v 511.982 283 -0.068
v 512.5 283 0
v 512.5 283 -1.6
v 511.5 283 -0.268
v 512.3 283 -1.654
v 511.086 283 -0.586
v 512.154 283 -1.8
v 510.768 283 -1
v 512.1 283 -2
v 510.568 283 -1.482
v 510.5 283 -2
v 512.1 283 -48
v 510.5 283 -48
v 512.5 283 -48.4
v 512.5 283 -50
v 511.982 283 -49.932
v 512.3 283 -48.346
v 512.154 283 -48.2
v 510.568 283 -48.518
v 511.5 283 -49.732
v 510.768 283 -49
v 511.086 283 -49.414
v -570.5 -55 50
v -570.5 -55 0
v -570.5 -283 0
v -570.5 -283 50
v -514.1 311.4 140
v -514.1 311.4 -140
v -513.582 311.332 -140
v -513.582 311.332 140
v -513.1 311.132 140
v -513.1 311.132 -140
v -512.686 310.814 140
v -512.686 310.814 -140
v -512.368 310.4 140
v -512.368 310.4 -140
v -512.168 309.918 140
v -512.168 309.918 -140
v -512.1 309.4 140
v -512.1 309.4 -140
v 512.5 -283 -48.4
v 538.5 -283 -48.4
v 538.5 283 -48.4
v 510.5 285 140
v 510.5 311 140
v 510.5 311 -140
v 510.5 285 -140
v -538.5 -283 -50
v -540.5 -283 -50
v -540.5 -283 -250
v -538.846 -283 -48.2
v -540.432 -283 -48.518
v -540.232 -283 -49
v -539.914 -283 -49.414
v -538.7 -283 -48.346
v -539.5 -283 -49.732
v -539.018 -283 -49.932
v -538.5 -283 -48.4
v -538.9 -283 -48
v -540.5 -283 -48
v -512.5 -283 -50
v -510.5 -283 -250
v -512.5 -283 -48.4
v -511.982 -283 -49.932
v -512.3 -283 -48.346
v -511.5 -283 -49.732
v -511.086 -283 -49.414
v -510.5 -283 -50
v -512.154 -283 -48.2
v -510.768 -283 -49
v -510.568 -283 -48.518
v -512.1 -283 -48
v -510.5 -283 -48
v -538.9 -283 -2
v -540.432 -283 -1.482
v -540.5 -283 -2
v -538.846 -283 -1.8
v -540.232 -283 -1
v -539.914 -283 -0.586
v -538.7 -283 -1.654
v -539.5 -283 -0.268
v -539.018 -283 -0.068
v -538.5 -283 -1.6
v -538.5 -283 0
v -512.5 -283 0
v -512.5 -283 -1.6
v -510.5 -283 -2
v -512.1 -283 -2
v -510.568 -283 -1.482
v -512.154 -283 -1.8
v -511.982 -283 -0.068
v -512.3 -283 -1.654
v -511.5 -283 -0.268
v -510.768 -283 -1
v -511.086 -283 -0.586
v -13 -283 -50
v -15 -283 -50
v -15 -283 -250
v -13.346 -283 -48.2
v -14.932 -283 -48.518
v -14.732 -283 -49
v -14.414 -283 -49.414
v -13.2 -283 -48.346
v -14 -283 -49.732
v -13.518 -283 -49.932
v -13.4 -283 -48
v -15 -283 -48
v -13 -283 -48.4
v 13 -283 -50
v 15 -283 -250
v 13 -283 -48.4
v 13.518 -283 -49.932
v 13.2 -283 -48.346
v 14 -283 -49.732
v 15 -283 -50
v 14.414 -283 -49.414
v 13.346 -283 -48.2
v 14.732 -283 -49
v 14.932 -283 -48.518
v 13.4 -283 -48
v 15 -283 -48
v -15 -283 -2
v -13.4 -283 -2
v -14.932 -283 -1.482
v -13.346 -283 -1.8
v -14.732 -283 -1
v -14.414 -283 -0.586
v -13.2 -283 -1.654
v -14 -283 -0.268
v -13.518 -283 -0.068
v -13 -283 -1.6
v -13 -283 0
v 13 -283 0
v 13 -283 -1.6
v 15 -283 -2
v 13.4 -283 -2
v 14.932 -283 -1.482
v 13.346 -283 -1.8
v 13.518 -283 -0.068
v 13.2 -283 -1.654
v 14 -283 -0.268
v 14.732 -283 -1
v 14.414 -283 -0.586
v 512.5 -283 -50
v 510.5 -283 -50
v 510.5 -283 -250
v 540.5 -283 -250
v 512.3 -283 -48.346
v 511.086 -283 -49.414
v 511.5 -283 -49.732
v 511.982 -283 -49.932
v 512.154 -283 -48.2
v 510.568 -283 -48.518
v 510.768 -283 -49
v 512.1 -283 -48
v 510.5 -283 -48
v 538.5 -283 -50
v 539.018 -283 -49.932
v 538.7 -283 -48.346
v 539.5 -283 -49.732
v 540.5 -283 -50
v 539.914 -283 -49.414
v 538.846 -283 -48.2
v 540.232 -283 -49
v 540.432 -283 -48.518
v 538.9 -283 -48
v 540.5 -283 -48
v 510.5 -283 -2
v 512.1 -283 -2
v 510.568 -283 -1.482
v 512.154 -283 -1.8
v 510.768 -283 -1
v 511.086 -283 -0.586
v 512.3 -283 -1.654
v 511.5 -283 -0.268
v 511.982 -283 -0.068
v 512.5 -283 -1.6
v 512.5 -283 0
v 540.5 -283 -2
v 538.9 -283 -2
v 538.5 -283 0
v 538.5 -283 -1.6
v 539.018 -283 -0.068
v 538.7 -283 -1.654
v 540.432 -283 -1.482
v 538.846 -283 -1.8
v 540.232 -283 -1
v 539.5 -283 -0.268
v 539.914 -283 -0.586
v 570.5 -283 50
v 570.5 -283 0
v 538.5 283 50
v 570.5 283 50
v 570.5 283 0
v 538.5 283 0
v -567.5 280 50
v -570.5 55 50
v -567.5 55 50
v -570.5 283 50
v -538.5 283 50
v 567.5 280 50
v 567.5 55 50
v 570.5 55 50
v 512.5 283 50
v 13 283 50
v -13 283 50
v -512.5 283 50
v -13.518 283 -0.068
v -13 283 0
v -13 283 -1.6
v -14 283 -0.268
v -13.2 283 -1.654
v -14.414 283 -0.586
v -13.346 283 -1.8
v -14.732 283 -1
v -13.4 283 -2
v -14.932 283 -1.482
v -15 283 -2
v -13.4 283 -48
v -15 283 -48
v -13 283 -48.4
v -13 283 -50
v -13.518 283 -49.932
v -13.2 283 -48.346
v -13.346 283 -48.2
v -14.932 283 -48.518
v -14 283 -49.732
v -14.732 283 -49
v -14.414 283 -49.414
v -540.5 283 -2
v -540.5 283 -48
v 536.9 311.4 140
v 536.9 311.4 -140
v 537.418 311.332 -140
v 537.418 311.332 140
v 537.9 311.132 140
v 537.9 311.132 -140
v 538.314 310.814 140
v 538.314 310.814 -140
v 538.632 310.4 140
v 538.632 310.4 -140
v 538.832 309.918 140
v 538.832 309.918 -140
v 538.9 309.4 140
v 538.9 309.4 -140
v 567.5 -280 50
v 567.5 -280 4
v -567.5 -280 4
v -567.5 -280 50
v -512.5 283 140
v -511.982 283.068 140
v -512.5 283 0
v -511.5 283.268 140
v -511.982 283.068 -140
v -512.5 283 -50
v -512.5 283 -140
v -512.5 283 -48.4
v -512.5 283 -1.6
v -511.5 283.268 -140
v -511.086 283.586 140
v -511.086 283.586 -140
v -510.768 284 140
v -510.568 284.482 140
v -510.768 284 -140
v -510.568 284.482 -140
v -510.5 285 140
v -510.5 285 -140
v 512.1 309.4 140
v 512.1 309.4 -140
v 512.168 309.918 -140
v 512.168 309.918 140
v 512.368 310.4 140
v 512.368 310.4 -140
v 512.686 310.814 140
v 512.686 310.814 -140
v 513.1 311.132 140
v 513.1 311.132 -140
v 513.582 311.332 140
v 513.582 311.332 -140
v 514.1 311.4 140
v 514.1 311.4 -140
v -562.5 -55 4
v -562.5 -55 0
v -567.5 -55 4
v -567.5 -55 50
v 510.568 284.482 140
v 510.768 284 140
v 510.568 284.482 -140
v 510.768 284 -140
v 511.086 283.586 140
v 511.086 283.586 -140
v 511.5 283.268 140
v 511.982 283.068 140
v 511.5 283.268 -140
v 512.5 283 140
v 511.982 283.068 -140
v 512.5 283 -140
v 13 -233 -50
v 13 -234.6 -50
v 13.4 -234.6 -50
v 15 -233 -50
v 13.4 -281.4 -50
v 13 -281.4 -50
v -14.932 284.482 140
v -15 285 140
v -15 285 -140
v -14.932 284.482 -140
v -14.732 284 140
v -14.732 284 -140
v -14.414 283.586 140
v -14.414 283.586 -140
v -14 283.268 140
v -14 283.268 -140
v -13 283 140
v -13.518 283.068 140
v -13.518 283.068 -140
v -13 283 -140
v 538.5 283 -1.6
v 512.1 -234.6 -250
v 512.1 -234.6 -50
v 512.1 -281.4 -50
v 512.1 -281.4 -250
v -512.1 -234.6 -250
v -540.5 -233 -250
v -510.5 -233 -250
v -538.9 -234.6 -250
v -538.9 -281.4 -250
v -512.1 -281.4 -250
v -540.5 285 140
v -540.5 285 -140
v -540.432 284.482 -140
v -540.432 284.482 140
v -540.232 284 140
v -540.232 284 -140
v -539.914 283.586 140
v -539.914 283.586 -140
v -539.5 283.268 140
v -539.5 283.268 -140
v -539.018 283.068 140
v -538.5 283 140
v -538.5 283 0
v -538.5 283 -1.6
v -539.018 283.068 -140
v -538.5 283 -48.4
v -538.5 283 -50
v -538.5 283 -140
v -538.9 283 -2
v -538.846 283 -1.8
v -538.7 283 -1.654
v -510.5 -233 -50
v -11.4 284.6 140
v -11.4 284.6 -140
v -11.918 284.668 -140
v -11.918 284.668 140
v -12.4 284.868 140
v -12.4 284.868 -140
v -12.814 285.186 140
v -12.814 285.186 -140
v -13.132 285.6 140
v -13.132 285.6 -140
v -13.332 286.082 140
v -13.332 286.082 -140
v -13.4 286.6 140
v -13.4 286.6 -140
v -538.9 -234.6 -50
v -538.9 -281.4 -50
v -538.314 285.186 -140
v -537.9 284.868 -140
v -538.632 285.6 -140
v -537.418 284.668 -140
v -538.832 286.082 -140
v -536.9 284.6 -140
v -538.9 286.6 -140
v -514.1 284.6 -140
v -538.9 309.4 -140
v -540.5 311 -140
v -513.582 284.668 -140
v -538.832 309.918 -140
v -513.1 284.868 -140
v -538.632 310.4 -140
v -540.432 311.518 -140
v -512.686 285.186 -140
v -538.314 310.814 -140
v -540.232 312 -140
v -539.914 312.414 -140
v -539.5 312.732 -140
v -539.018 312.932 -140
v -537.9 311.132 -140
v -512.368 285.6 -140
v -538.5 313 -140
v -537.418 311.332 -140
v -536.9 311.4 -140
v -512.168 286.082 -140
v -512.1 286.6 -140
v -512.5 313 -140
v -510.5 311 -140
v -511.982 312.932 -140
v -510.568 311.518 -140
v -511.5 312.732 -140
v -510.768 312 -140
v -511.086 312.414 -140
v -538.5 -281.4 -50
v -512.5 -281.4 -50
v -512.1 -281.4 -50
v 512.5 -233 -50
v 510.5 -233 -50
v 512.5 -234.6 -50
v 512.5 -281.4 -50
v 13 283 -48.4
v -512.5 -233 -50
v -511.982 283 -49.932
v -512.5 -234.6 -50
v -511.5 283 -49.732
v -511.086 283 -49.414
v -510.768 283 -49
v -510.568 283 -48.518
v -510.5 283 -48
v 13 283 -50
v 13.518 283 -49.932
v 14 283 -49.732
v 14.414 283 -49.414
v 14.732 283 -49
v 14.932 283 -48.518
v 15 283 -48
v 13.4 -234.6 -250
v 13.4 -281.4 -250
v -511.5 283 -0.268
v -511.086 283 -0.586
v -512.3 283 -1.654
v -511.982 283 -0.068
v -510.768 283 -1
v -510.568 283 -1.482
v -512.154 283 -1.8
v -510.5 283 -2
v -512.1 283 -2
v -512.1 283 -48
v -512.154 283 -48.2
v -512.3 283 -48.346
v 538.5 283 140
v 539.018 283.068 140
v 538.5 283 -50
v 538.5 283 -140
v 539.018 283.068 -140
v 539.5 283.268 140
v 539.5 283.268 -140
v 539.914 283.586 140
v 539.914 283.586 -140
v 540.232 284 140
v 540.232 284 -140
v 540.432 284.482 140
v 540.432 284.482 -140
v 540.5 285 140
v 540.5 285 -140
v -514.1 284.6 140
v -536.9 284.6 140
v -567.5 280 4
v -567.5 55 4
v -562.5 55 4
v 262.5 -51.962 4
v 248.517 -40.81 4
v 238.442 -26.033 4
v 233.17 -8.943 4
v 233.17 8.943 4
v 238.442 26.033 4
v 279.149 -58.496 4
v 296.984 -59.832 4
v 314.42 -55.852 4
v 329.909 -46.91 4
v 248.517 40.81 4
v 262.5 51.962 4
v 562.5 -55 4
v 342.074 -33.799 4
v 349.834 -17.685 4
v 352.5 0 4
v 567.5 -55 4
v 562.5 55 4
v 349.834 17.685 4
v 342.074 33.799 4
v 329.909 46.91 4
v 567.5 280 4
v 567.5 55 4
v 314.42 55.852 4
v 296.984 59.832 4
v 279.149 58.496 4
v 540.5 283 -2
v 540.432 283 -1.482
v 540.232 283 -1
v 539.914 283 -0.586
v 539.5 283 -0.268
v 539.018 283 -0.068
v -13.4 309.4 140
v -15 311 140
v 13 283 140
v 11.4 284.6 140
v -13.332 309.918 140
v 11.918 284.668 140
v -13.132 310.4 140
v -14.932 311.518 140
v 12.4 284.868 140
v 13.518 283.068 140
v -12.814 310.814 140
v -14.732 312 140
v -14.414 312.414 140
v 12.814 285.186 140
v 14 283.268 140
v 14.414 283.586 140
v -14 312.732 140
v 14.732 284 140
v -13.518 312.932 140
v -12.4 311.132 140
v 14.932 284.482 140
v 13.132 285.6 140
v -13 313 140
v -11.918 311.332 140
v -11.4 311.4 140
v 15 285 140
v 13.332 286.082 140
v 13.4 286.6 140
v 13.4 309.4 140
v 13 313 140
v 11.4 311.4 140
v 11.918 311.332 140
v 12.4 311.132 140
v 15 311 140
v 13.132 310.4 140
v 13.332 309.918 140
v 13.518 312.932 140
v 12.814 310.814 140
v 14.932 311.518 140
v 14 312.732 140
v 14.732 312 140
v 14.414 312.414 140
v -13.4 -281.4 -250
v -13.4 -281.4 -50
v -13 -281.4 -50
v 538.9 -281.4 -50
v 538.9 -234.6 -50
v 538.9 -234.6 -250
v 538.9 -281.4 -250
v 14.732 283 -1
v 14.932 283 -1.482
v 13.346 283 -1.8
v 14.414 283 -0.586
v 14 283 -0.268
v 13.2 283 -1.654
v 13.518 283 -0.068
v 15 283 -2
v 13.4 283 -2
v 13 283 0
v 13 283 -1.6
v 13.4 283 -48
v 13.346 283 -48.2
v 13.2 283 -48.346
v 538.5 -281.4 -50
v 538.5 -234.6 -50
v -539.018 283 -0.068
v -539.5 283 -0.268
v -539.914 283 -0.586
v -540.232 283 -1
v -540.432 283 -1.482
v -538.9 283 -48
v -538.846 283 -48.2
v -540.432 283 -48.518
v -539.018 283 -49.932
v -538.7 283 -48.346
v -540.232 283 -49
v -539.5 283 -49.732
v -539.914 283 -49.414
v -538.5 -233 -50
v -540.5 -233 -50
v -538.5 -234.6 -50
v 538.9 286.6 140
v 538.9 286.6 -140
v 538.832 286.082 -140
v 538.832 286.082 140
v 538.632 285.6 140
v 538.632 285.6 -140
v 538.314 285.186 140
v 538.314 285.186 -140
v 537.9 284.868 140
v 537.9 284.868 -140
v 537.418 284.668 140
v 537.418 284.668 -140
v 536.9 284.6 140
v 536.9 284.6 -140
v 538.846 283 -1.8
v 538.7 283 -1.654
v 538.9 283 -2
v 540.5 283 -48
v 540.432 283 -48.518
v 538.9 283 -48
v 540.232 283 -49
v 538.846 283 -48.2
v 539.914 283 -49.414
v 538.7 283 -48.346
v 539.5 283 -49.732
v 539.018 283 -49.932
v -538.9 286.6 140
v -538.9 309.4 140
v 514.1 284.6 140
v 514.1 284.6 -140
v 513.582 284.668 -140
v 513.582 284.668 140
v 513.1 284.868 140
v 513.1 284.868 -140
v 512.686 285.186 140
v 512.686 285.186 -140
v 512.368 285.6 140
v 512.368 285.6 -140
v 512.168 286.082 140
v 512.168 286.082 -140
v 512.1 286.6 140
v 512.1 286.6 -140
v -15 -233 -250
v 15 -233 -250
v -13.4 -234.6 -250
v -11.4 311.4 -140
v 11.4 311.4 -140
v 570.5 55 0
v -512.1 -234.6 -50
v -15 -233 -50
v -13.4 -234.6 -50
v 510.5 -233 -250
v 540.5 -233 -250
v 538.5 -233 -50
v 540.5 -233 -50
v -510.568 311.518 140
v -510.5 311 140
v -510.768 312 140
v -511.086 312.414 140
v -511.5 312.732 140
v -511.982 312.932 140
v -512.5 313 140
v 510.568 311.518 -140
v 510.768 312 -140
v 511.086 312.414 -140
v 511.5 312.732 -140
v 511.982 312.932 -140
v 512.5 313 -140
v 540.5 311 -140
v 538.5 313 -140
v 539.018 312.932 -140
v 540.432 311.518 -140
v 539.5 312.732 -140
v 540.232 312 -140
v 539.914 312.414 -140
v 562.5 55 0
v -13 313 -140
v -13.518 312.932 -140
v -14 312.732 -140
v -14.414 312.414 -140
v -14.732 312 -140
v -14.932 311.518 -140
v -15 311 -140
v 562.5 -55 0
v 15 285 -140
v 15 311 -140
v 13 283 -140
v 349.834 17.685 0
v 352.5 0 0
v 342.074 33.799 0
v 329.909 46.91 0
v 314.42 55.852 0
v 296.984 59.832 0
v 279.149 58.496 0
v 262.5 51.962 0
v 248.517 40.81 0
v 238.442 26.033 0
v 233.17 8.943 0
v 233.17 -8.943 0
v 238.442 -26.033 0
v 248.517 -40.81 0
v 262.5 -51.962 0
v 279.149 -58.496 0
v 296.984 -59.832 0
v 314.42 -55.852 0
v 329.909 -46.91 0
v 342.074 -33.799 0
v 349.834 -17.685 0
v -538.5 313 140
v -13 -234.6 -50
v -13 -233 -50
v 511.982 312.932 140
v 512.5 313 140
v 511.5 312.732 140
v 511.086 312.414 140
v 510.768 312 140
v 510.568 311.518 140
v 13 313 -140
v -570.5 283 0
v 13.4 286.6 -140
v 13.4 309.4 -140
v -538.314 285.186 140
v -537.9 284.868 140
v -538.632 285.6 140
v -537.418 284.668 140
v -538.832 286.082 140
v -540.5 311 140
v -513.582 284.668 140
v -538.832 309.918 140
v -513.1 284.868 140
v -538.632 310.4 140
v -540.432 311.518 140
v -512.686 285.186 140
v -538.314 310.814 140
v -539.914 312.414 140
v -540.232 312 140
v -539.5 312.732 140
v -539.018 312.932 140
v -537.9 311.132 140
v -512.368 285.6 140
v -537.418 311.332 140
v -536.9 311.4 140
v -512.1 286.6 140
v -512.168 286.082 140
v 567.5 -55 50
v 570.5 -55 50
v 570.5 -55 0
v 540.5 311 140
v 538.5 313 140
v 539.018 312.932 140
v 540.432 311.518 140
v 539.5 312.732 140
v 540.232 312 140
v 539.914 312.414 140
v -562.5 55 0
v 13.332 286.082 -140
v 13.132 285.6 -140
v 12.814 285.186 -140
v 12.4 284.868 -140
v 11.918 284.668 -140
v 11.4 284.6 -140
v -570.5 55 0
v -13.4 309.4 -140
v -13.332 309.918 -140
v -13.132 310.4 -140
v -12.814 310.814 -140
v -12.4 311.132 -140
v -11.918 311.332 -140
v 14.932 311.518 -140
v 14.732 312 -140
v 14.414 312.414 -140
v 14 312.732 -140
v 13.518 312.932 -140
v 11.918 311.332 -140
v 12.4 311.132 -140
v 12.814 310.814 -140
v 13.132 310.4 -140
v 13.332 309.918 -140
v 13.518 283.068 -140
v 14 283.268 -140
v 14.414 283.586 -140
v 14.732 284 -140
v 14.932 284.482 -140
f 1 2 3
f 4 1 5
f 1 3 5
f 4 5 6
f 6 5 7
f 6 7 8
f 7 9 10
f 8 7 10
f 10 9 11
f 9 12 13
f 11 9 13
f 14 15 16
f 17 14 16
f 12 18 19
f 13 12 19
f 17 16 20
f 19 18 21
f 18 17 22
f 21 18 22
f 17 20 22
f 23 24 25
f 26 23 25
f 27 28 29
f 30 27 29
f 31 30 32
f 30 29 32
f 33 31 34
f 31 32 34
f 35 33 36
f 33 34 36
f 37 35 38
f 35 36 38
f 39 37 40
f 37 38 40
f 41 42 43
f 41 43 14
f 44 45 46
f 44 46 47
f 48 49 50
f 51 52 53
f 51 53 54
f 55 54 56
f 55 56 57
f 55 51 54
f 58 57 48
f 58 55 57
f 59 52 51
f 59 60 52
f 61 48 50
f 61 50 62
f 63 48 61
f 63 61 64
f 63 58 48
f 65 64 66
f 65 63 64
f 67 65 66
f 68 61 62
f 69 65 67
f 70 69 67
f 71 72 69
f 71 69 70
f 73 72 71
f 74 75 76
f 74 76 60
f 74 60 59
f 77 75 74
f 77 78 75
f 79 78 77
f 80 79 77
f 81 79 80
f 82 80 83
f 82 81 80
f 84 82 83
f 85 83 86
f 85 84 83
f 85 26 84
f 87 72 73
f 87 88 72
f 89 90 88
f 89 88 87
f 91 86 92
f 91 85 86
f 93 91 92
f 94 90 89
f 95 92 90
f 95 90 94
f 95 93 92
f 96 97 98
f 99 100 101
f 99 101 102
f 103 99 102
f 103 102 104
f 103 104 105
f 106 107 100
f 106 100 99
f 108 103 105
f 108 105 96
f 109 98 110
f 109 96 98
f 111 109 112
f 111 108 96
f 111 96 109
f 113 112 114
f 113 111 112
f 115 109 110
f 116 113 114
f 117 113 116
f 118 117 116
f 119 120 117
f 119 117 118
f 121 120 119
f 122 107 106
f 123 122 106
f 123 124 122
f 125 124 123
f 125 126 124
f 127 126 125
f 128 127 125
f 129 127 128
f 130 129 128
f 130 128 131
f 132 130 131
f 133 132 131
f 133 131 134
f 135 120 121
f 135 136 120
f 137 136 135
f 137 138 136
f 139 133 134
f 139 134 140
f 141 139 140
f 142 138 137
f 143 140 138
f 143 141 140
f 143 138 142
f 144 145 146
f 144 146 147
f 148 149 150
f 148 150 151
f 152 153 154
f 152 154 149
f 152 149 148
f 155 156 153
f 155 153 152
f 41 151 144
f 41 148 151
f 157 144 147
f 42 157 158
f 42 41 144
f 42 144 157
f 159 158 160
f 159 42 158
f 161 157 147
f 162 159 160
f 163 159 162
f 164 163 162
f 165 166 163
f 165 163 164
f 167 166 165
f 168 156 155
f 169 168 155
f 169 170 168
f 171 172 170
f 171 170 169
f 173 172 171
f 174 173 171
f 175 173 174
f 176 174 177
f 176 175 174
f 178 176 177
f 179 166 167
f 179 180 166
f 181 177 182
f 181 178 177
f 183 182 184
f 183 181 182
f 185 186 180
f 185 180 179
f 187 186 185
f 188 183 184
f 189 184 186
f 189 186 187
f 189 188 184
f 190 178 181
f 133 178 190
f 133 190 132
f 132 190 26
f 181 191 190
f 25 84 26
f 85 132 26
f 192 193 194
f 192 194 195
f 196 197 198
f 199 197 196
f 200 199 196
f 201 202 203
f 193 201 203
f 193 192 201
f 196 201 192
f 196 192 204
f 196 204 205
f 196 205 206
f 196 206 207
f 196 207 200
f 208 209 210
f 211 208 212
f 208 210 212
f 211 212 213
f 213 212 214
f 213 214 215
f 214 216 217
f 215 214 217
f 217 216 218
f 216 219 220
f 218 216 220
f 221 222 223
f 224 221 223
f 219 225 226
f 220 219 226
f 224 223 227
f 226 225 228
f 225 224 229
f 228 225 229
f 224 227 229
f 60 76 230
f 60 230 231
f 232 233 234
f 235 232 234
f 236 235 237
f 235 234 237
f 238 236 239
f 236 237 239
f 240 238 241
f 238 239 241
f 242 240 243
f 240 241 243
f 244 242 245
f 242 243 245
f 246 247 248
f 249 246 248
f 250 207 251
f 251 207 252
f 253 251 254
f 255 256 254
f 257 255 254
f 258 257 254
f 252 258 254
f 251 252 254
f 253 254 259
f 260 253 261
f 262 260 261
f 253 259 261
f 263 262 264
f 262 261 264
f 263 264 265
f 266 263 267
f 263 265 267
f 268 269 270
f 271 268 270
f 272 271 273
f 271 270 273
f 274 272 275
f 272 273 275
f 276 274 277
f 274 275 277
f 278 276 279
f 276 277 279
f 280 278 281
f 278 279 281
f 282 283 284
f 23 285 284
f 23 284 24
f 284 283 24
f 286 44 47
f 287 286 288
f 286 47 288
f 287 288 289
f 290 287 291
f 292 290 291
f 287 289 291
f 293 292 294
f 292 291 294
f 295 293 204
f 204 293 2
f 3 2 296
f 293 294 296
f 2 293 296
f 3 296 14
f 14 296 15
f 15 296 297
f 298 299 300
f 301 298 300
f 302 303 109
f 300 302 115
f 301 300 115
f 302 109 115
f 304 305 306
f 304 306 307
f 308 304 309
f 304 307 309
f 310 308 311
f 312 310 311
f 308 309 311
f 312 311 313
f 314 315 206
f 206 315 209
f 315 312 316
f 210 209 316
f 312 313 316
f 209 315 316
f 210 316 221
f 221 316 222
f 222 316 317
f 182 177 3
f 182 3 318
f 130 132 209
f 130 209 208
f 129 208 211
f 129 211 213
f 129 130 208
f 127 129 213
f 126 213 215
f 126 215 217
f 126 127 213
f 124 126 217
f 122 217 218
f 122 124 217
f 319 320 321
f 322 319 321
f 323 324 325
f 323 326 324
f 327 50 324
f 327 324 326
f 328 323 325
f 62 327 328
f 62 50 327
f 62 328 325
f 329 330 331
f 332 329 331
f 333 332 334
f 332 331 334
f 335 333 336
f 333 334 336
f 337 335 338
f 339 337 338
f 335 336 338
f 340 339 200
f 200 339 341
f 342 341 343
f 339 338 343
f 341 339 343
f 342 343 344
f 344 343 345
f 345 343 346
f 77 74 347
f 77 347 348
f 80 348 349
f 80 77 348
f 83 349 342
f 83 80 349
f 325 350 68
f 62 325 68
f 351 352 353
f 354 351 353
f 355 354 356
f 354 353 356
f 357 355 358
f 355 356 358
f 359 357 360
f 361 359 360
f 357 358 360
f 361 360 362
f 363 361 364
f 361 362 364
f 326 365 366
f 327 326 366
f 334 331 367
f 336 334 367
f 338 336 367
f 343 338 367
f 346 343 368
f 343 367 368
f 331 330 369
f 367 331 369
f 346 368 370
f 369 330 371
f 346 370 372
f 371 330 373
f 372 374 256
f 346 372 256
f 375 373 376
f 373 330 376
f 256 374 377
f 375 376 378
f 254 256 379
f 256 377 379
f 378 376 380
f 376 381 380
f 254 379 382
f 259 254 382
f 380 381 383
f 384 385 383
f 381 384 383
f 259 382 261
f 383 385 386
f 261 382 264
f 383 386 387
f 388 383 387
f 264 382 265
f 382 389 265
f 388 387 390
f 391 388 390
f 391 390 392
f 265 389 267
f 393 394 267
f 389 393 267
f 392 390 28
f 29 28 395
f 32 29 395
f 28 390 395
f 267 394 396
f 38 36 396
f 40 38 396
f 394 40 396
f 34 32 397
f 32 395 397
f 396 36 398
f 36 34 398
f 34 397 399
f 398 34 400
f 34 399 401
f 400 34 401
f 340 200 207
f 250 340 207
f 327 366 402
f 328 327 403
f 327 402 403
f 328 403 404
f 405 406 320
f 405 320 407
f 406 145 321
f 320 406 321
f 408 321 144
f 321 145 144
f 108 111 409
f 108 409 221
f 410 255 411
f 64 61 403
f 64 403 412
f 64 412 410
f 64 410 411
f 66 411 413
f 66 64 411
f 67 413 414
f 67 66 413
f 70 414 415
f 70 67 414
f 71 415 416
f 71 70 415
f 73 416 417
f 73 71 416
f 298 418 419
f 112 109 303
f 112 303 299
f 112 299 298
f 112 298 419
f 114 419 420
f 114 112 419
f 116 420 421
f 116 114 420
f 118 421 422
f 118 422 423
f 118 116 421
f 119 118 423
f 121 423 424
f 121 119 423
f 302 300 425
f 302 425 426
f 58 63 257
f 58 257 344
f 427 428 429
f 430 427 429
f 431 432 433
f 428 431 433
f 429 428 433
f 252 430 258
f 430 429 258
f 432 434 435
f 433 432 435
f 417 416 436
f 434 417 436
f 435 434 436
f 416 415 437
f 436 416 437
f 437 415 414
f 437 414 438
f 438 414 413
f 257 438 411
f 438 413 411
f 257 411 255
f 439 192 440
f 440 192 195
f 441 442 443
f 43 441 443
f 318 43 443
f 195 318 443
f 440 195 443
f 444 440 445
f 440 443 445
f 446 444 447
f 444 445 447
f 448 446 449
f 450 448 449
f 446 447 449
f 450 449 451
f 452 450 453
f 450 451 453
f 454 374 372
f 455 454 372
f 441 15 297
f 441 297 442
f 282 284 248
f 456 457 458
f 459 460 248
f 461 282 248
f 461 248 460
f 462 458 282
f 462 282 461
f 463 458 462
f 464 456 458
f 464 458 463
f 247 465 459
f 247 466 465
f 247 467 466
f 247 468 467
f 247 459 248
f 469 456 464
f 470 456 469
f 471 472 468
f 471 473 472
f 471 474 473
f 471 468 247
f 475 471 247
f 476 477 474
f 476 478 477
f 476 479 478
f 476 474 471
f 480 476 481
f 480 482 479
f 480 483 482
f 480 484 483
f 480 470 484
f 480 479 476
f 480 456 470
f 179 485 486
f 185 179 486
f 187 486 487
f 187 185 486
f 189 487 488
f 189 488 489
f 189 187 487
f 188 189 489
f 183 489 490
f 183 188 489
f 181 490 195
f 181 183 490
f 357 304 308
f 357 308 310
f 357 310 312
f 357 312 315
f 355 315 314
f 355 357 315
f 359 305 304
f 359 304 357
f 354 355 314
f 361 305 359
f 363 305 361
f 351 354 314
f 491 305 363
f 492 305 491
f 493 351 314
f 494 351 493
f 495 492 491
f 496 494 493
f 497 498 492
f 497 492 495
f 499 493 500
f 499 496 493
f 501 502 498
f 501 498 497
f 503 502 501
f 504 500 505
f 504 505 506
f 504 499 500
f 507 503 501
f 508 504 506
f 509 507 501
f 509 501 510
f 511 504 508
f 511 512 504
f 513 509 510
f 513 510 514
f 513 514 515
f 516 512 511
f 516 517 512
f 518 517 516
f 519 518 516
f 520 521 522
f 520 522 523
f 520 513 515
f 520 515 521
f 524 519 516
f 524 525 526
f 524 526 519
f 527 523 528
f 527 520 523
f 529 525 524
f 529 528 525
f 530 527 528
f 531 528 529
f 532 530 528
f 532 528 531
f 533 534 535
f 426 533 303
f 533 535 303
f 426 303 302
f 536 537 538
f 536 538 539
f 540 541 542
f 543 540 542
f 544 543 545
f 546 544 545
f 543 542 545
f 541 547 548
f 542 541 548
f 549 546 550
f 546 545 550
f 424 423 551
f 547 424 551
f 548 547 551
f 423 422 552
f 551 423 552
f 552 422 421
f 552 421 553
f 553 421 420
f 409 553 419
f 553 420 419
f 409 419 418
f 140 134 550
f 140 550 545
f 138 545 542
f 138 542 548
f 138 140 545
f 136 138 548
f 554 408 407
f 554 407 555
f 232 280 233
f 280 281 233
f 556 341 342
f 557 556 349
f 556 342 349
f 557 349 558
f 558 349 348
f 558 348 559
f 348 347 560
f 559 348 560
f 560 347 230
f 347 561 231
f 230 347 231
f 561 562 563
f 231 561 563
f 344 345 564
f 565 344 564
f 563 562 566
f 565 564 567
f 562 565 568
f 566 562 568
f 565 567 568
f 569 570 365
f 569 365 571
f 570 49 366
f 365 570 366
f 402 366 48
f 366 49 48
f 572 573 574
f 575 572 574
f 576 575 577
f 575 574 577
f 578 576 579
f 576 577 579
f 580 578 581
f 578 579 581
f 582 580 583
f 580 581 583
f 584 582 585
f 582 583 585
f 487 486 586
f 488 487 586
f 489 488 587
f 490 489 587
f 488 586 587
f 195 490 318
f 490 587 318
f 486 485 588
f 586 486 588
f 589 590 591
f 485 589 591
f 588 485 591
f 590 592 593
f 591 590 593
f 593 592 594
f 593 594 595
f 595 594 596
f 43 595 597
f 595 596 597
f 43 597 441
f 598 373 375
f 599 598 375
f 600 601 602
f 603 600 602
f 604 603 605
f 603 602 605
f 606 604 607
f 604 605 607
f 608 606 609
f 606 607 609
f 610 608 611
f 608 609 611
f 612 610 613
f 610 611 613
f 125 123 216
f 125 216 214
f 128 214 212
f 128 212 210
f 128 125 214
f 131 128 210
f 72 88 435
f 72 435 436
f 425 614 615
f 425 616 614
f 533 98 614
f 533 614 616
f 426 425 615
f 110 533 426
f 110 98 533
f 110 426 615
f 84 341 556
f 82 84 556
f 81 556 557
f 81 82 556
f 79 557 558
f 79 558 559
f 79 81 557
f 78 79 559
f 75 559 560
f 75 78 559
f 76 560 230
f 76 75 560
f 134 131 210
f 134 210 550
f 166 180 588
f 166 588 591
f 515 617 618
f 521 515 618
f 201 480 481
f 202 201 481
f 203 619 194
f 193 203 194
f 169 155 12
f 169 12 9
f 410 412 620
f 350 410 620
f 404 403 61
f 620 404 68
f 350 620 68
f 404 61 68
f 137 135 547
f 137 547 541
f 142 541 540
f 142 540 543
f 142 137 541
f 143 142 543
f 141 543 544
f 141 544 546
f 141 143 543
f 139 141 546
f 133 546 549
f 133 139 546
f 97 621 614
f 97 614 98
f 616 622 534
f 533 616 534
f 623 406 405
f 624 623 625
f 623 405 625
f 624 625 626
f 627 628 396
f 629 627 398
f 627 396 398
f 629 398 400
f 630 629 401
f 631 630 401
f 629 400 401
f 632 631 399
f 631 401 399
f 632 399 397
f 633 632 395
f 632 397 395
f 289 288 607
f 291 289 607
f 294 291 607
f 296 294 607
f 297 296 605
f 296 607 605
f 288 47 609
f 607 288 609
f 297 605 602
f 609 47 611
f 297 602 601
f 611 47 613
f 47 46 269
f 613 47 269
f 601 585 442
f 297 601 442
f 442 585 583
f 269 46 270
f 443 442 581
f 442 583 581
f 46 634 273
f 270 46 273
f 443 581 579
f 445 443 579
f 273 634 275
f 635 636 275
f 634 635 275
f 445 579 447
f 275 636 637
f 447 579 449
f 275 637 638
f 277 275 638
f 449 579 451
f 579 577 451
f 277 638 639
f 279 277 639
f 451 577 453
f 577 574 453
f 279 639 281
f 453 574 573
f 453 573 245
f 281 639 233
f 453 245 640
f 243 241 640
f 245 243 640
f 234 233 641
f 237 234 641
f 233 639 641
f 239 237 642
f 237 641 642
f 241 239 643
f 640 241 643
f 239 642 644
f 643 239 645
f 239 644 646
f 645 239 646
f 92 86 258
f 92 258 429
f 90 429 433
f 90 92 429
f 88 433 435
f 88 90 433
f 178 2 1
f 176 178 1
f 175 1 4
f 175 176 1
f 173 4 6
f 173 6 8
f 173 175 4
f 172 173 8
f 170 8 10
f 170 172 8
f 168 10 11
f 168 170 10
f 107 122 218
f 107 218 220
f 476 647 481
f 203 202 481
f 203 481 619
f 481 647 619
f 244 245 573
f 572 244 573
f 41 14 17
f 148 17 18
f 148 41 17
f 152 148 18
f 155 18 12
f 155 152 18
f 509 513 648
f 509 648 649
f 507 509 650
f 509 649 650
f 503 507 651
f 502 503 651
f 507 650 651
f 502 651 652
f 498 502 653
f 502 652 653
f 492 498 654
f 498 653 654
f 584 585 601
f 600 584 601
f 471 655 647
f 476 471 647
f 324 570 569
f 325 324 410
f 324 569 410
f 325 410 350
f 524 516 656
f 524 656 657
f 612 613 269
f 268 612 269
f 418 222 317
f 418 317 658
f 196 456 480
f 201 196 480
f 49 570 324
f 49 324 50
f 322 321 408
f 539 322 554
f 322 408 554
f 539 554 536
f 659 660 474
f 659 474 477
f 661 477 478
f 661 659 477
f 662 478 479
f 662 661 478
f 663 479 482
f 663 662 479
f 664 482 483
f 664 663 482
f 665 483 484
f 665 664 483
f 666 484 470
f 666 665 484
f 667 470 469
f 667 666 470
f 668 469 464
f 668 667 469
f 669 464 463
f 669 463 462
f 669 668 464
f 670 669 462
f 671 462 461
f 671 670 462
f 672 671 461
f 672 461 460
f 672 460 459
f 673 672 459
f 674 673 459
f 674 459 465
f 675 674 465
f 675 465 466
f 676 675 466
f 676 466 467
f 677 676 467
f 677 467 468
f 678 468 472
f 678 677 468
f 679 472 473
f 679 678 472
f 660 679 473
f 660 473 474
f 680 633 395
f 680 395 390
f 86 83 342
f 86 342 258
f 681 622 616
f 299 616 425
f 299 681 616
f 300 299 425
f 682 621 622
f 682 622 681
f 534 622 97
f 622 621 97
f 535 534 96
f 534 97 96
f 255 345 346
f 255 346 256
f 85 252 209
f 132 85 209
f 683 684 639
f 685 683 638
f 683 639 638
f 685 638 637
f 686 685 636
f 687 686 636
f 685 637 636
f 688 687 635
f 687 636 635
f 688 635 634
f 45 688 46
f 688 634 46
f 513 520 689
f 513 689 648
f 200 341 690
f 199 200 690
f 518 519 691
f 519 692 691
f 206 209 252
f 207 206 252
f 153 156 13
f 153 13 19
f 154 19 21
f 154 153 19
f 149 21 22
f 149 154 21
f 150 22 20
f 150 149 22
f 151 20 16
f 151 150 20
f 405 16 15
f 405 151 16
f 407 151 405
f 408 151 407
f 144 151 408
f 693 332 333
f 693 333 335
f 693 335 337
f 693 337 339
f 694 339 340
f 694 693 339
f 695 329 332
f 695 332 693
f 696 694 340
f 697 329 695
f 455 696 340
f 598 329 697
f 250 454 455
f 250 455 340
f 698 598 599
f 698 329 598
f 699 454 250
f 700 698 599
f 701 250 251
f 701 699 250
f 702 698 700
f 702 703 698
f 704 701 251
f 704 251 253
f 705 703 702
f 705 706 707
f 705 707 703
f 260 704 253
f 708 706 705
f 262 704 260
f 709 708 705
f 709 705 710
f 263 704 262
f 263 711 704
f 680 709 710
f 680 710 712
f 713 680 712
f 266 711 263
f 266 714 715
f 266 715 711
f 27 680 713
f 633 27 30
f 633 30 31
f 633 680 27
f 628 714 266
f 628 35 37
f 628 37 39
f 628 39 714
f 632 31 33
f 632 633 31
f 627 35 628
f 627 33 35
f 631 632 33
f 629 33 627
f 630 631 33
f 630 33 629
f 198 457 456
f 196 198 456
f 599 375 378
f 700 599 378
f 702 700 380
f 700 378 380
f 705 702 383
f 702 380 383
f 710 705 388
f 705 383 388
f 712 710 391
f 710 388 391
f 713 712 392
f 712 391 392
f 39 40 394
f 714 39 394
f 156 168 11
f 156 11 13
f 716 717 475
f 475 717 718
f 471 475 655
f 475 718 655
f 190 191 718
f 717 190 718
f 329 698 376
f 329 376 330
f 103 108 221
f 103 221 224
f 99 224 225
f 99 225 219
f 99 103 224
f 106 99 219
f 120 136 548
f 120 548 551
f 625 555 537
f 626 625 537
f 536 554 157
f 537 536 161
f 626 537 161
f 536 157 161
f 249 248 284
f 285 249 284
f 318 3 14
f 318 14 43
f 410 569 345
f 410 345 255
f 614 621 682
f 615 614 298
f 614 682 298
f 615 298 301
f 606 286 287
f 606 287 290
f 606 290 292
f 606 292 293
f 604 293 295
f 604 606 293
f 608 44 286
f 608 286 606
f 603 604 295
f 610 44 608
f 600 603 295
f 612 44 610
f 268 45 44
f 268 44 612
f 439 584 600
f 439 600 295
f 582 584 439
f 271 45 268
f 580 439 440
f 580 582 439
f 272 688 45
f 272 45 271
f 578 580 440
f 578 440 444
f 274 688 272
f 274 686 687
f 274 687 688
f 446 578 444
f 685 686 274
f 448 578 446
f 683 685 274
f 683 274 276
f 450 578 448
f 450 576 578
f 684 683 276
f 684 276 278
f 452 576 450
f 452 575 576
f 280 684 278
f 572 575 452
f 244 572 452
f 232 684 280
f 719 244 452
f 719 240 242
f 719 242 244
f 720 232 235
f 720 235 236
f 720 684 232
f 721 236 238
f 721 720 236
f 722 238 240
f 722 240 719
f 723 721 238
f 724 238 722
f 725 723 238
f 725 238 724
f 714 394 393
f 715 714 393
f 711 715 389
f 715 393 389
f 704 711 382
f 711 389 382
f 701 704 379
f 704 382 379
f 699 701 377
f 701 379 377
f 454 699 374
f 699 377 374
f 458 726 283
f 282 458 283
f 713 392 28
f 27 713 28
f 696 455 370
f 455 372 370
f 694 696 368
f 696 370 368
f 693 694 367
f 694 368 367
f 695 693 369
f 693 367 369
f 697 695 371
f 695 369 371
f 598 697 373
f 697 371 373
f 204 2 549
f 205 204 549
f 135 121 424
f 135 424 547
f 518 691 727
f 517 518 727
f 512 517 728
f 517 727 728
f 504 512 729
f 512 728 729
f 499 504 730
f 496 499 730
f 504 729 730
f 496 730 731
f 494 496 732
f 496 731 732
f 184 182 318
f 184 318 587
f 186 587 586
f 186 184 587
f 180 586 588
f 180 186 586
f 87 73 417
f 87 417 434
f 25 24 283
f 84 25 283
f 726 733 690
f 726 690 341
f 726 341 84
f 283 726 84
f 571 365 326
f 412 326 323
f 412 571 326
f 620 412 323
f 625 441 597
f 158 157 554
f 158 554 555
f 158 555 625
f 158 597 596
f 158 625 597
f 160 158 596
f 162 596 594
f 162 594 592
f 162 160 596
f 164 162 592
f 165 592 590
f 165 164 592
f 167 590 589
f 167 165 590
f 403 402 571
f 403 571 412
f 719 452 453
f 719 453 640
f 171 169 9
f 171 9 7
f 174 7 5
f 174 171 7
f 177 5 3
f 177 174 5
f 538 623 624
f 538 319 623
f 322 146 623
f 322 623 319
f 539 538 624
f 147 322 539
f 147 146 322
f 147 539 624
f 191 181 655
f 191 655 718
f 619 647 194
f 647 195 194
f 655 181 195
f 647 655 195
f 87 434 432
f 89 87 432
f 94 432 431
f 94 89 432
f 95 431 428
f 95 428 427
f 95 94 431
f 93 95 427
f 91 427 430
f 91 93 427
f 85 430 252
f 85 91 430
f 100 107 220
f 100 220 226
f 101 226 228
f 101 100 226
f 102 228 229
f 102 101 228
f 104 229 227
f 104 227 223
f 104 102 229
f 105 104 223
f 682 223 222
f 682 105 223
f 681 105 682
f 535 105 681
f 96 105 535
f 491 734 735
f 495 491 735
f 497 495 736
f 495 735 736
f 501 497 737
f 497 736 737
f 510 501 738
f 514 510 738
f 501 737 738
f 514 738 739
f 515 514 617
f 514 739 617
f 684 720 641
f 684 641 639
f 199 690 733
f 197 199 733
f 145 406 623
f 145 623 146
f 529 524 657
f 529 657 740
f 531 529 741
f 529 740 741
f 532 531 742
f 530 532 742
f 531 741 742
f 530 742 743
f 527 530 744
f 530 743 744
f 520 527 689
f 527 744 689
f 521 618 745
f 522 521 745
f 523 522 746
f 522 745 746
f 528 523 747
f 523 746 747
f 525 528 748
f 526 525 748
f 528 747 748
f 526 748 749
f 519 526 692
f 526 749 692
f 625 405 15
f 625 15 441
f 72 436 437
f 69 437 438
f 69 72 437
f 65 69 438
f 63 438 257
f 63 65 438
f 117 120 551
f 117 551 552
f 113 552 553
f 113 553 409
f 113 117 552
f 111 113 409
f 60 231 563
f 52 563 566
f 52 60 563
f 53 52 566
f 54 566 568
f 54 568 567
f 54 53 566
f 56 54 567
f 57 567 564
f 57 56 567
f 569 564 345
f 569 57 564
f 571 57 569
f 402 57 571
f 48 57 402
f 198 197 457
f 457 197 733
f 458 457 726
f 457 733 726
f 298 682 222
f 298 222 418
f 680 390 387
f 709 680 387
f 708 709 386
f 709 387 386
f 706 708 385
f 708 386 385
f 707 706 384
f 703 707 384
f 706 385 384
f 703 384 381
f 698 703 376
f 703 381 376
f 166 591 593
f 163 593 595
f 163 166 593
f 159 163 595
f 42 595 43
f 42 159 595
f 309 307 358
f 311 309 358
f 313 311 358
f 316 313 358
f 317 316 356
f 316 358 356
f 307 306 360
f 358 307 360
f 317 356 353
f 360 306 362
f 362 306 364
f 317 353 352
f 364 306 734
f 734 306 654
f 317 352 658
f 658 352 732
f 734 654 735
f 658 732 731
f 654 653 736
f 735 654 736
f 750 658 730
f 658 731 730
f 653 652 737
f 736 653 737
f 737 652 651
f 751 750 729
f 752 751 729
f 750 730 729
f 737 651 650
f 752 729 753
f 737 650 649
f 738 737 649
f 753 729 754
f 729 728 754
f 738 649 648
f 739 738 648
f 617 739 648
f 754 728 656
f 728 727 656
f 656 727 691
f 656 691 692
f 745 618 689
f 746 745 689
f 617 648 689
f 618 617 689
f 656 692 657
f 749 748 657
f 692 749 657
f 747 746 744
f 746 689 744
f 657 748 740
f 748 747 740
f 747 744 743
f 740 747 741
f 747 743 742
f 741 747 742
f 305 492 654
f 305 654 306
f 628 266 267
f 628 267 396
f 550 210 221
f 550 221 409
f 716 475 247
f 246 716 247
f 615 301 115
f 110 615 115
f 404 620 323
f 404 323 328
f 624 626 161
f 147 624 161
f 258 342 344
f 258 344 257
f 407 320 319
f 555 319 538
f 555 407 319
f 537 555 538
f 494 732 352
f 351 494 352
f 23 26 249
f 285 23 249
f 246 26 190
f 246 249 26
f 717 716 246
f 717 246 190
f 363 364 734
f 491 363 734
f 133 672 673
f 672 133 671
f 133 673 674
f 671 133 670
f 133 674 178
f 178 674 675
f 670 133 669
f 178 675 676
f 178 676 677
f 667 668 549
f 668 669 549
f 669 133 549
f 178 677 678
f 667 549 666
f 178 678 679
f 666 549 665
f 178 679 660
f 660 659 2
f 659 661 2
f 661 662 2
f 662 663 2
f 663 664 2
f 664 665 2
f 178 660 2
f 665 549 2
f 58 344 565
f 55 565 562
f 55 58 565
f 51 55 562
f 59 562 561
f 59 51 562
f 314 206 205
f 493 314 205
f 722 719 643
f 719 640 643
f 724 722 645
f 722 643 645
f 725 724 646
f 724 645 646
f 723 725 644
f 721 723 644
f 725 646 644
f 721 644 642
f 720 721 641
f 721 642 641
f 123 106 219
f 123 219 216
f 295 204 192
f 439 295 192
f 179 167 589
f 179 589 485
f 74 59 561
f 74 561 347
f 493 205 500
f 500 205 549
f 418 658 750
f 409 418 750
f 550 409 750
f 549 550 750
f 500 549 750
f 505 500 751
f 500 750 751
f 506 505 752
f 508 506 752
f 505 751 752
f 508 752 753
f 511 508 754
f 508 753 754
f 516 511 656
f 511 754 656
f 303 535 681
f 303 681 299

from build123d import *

# Parameters (mm, degrees)
F0_R          = 60
F1_DEPTH      = 4
F2_DEPTH      = 50
F4_DEPTH      = 566
F5_DEPTH      = 140
F5_DEPTH_BACK = 140
F6_W          = 30
F6_H          = 50
F6_W_2        = 26.8
F6_H_2        = 46.8
F7_DEPTH      = 200


with BuildPart() as f1:
    # F0 (on Top) → F1 (new body)
    with BuildSketch(Plane.XY):
        Polygon((567.5, 55), (567.5, 280), (-567.5, 280), (-567.5, 55), (-562.5, 55), (-562.5, -55), (-567.5, -55), (-567.5, -280), (567.5, -280), (567.5, -55), (562.5, -55), (562.5, 55), align=None)
        with Locations((292.5, 0)):
            Circle(F0_R, mode=Mode.SUBTRACT)
    extrude(amount=F1_DEPTH)

    # F0 (on Top) → F2 (join)
    with BuildSketch(Plane.XY):
        Polygon((-567.5, 280), (567.5, 280), (567.5, 55), (570.5, 55), (570.5, 283), (538.5, 283), (512.5, 283), (13, 283), (-13, 283), (-512.5, 283), (-538.5, 283), (-570.5, 283), (-570.5, 55), (-567.5, 55), align=None)
        Polygon((570.5, -55), (567.5, -55), (567.5, -280), (-567.5, -280), (-567.5, -55), (-570.5, -55), (-570.5, -283), (570.5, -283), align=None)
    extrude(amount=F2_DEPTH)

    # F3 (on face) → F4 (join)
    with BuildSketch(Plane.XZ.offset(283)):
        with BuildLine():
            Line((-512.5, 0), (-538.5, 0))
            ThreePointArc((-538.5, 0), (-539.9142135624, -0.5857864376), (-540.5, -2))
            Line((-540.5, -2), (-540.5, -48))
            ThreePointArc((-540.5, -48), (-539.9142135624, -49.4142135624), (-538.5, -50))
            Line((-538.5, -50), (-512.5, -50))
            ThreePointArc((-512.5, -50), (-511.0857864376, -49.4142135624), (-510.5, -48))
            Line((-510.5, -48), (-510.5, -2))
            ThreePointArc((-510.5, -2), (-511.0857864376, -0.5857864376), (-512.5, 0))
        make_face()
        with BuildLine():
            Line((-538.9, -48), (-538.9, -2))
            ThreePointArc((-538.9, -2), (-538.7828427125, -1.7171572875), (-538.5, -1.6))
            Line((-538.5, -1.6), (-512.5, -1.6))
            ThreePointArc((-512.5, -1.6), (-512.2171572875, -1.7171572875), (-512.1, -2))
            Line((-512.1, -2), (-512.1, -48))
            ThreePointArc((-512.1, -48), (-512.2171572875, -48.2828427125), (-512.5, -48.4))
            Line((-512.5, -48.4), (-538.5, -48.4))
            ThreePointArc((-538.5, -48.4), (-538.7828427125, -48.2828427125), (-538.9, -48))
        make_face(mode=Mode.SUBTRACT)
        with BuildLine():
            Line((13, 0), (-13, 0))
            ThreePointArc((-13, 0), (-14.4142135624, -0.5857864376), (-15, -2))
            Line((-15, -2), (-15, -48))
            ThreePointArc((-15, -48), (-14.4142135624, -49.4142135624), (-13, -50))
            Line((-13, -50), (13, -50))
            ThreePointArc((13, -50), (14.4142135624, -49.4142135624), (15, -48))
            Line((15, -48), (15, -2))
            ThreePointArc((15, -2), (14.4142135624, -0.5857864376), (13, 0))
        make_face()
        with BuildLine():
            Line((-13.4, -48), (-13.4, -2))
            ThreePointArc((-13.4, -2), (-13.2828427125, -1.7171572875), (-13, -1.6))
            Line((-13, -1.6), (13, -1.6))
            ThreePointArc((13, -1.6), (13.2828427125, -1.7171572875), (13.4, -2))
            Line((13.4, -2), (13.4, -48))
            ThreePointArc((13.4, -48), (13.2828427125, -48.2828427125), (13, -48.4))
            Line((13, -48.4), (-13, -48.4))
            ThreePointArc((-13, -48.4), (-13.2828427125, -48.2828427125), (-13.4, -48))
        make_face(mode=Mode.SUBTRACT)
        with BuildLine():
            Line((538.5, 0), (512.5, 0))
            ThreePointArc((512.5, 0), (511.0857864376, -0.5857864376), (510.5, -2))
            Line((510.5, -2), (510.5, -48))
            ThreePointArc((510.5, -48), (511.0857864376, -49.4142135624), (512.5, -50))
            Line((512.5, -50), (538.5, -50))
            ThreePointArc((538.5, -50), (539.9142135624, -49.4142135624), (540.5, -48))
            Line((540.5, -48), (540.5, -2))
            ThreePointArc((540.5, -2), (539.9142135624, -0.5857864376), (538.5, 0))
        make_face()
        with BuildLine():
            ThreePointArc((538.9, -48), (538.7828427125, -48.2828427125), (538.5, -48.4))
            Line((538.5, -48.4), (512.5, -48.4))
            ThreePointArc((512.5, -48.4), (512.2171572875, -48.2828427125), (512.1, -48))
            Line((512.1, -48), (512.1, -2))
            ThreePointArc((512.1, -2), (512.2171572875, -1.7171572875), (512.5, -1.6))
            Line((512.5, -1.6), (538.5, -1.6))
            ThreePointArc((538.5, -1.6), (538.7828427125, -1.7171572875), (538.9, -2))
            Line((538.9, -2), (538.9, -48))
        make_face(mode=Mode.SUBTRACT)
    extrude(amount=-F4_DEPTH)

    # F0 (on Top) → F5 (join, two sides)
    with BuildSketch(Plane.XY) as f5_sk:
        with BuildLine():
            ThreePointArc((-540.5, 285), (-539.9142135624, 283.5857864376), (-538.5, 283))
            Line((-538.5, 283), (-512.5, 283))
            ThreePointArc((-512.5, 283), (-511.0857864376, 283.5857864376), (-510.5, 285))
            Line((-510.5, 285), (-510.5, 311))
            ThreePointArc((-510.5, 311), (-511.0857864376, 312.4142135624), (-512.5, 313))
            Line((-512.5, 313), (-538.5, 313))
            ThreePointArc((-538.5, 313), (-539.9142135624, 312.4142135624), (-540.5, 311))
            Line((-540.5, 311), (-540.5, 285))
        make_face()
        with BuildLine():
            ThreePointArc((-536.9, 284.6), (-538.3142135624, 285.1857864376), (-538.9, 286.6))
            Line((-538.9, 286.6), (-538.9, 309.4))
            ThreePointArc((-538.9, 309.4), (-538.3142135624, 310.8142135624), (-536.9, 311.4))
            Line((-536.9, 311.4), (-514.1, 311.4))
            ThreePointArc((-514.1, 311.4), (-512.6857864376, 310.8142135624), (-512.1, 309.4))
            Line((-512.1, 309.4), (-512.1, 286.6))
            ThreePointArc((-512.1, 286.6), (-512.6857864376, 285.1857864376), (-514.1, 284.6))
            Line((-514.1, 284.6), (-536.9, 284.6))
        make_face(mode=Mode.SUBTRACT)
        with BuildLine():
            Line((-13, 283), (13, 283))
            ThreePointArc((13, 283), (14.4142135624, 283.5857864376), (15, 285))
            Line((15, 285), (15, 311))
            ThreePointArc((15, 311), (14.4142135624, 312.4142135624), (13, 313))
            Line((13, 313), (-13, 313))
            ThreePointArc((-13, 313), (-14.4142135624, 312.4142135624), (-15, 311))
            Line((-15, 311), (-15, 285))
            ThreePointArc((-15, 285), (-14.4142135624, 283.5857864376), (-13, 283))
        make_face()
        with BuildLine():
            Line((13.4, 309.4), (13.4, 286.6))
            ThreePointArc((13.4, 286.6), (12.8142135624, 285.1857864376), (11.4, 284.6))
            Line((11.4, 284.6), (-11.4, 284.6))
            ThreePointArc((-11.4, 284.6), (-12.8142135624, 285.1857864376), (-13.4, 286.6))
            Line((-13.4, 286.6), (-13.4, 309.4))
            ThreePointArc((-13.4, 309.4), (-12.8142135624, 310.8142135624), (-11.4, 311.4))
            Line((-11.4, 311.4), (11.4, 311.4))
            ThreePointArc((11.4, 311.4), (12.8142135624, 310.8142135624), (13.4, 309.4))
        make_face(mode=Mode.SUBTRACT)
        with BuildLine():
            Line((512.5, 283), (538.5, 283))
            ThreePointArc((538.5, 283), (539.9142135624, 283.5857864376), (540.5, 285))
            Line((540.5, 285), (540.5, 311))
            ThreePointArc((540.5, 311), (539.9142135624, 312.4142135624), (538.5, 313))
            Line((538.5, 313), (512.5, 313))
            ThreePointArc((512.5, 313), (511.0857864376, 312.4142135624), (510.5, 311))
            Line((510.5, 311), (510.5, 285))
            ThreePointArc((510.5, 285), (511.0857864376, 283.5857864376), (512.5, 283))
        make_face()
        with BuildLine():
            Line((514.1, 311.4), (536.9, 311.4))
            ThreePointArc((536.9, 311.4), (538.3142135624, 310.8142135624), (538.9, 309.4))
            Line((538.9, 309.4), (538.9, 286.6))
            ThreePointArc((538.9, 286.6), (538.3142135624, 285.1857864376), (536.9, 284.6))
            Line((536.9, 284.6), (514.1, 284.6))
            ThreePointArc((514.1, 284.6), (512.6857864376, 285.1857864376), (512.1, 286.6))
            Line((512.1, 286.6), (512.1, 309.4))
            ThreePointArc((512.1, 309.4), (512.6857864376, 310.8142135624), (514.1, 311.4))
        make_face(mode=Mode.SUBTRACT)
    extrude(amount=-F5_DEPTH)
    extrude(f5_sk.sketch, amount=F5_DEPTH_BACK)

    # F6 (on face) → F7 (join)
    with BuildSketch(Plane(origin=(0, 0, -50), x_dir=(1, 0, 0), z_dir=(0, 0, -1))):
        with Locations((0, 258)):
            Rectangle(F6_W, F6_H)
        with Locations((0, 258)):
            Rectangle(F6_W_2, F6_H_2, mode=Mode.SUBTRACT)
        with Locations((-525.5, 258)):
            Rectangle(F6_W, F6_H)
        with Locations((-525.5, 258)):
            Rectangle(F6_W_2, F6_H_2, mode=Mode.SUBTRACT)
        with Locations((525.5, 258)):
            Rectangle(F6_W, F6_H)
        with Locations((525.5, 258)):
            Rectangle(F6_W_2, F6_H_2, mode=Mode.SUBTRACT)
    extrude(amount=F7_DEPTH)


solid = f1.part
